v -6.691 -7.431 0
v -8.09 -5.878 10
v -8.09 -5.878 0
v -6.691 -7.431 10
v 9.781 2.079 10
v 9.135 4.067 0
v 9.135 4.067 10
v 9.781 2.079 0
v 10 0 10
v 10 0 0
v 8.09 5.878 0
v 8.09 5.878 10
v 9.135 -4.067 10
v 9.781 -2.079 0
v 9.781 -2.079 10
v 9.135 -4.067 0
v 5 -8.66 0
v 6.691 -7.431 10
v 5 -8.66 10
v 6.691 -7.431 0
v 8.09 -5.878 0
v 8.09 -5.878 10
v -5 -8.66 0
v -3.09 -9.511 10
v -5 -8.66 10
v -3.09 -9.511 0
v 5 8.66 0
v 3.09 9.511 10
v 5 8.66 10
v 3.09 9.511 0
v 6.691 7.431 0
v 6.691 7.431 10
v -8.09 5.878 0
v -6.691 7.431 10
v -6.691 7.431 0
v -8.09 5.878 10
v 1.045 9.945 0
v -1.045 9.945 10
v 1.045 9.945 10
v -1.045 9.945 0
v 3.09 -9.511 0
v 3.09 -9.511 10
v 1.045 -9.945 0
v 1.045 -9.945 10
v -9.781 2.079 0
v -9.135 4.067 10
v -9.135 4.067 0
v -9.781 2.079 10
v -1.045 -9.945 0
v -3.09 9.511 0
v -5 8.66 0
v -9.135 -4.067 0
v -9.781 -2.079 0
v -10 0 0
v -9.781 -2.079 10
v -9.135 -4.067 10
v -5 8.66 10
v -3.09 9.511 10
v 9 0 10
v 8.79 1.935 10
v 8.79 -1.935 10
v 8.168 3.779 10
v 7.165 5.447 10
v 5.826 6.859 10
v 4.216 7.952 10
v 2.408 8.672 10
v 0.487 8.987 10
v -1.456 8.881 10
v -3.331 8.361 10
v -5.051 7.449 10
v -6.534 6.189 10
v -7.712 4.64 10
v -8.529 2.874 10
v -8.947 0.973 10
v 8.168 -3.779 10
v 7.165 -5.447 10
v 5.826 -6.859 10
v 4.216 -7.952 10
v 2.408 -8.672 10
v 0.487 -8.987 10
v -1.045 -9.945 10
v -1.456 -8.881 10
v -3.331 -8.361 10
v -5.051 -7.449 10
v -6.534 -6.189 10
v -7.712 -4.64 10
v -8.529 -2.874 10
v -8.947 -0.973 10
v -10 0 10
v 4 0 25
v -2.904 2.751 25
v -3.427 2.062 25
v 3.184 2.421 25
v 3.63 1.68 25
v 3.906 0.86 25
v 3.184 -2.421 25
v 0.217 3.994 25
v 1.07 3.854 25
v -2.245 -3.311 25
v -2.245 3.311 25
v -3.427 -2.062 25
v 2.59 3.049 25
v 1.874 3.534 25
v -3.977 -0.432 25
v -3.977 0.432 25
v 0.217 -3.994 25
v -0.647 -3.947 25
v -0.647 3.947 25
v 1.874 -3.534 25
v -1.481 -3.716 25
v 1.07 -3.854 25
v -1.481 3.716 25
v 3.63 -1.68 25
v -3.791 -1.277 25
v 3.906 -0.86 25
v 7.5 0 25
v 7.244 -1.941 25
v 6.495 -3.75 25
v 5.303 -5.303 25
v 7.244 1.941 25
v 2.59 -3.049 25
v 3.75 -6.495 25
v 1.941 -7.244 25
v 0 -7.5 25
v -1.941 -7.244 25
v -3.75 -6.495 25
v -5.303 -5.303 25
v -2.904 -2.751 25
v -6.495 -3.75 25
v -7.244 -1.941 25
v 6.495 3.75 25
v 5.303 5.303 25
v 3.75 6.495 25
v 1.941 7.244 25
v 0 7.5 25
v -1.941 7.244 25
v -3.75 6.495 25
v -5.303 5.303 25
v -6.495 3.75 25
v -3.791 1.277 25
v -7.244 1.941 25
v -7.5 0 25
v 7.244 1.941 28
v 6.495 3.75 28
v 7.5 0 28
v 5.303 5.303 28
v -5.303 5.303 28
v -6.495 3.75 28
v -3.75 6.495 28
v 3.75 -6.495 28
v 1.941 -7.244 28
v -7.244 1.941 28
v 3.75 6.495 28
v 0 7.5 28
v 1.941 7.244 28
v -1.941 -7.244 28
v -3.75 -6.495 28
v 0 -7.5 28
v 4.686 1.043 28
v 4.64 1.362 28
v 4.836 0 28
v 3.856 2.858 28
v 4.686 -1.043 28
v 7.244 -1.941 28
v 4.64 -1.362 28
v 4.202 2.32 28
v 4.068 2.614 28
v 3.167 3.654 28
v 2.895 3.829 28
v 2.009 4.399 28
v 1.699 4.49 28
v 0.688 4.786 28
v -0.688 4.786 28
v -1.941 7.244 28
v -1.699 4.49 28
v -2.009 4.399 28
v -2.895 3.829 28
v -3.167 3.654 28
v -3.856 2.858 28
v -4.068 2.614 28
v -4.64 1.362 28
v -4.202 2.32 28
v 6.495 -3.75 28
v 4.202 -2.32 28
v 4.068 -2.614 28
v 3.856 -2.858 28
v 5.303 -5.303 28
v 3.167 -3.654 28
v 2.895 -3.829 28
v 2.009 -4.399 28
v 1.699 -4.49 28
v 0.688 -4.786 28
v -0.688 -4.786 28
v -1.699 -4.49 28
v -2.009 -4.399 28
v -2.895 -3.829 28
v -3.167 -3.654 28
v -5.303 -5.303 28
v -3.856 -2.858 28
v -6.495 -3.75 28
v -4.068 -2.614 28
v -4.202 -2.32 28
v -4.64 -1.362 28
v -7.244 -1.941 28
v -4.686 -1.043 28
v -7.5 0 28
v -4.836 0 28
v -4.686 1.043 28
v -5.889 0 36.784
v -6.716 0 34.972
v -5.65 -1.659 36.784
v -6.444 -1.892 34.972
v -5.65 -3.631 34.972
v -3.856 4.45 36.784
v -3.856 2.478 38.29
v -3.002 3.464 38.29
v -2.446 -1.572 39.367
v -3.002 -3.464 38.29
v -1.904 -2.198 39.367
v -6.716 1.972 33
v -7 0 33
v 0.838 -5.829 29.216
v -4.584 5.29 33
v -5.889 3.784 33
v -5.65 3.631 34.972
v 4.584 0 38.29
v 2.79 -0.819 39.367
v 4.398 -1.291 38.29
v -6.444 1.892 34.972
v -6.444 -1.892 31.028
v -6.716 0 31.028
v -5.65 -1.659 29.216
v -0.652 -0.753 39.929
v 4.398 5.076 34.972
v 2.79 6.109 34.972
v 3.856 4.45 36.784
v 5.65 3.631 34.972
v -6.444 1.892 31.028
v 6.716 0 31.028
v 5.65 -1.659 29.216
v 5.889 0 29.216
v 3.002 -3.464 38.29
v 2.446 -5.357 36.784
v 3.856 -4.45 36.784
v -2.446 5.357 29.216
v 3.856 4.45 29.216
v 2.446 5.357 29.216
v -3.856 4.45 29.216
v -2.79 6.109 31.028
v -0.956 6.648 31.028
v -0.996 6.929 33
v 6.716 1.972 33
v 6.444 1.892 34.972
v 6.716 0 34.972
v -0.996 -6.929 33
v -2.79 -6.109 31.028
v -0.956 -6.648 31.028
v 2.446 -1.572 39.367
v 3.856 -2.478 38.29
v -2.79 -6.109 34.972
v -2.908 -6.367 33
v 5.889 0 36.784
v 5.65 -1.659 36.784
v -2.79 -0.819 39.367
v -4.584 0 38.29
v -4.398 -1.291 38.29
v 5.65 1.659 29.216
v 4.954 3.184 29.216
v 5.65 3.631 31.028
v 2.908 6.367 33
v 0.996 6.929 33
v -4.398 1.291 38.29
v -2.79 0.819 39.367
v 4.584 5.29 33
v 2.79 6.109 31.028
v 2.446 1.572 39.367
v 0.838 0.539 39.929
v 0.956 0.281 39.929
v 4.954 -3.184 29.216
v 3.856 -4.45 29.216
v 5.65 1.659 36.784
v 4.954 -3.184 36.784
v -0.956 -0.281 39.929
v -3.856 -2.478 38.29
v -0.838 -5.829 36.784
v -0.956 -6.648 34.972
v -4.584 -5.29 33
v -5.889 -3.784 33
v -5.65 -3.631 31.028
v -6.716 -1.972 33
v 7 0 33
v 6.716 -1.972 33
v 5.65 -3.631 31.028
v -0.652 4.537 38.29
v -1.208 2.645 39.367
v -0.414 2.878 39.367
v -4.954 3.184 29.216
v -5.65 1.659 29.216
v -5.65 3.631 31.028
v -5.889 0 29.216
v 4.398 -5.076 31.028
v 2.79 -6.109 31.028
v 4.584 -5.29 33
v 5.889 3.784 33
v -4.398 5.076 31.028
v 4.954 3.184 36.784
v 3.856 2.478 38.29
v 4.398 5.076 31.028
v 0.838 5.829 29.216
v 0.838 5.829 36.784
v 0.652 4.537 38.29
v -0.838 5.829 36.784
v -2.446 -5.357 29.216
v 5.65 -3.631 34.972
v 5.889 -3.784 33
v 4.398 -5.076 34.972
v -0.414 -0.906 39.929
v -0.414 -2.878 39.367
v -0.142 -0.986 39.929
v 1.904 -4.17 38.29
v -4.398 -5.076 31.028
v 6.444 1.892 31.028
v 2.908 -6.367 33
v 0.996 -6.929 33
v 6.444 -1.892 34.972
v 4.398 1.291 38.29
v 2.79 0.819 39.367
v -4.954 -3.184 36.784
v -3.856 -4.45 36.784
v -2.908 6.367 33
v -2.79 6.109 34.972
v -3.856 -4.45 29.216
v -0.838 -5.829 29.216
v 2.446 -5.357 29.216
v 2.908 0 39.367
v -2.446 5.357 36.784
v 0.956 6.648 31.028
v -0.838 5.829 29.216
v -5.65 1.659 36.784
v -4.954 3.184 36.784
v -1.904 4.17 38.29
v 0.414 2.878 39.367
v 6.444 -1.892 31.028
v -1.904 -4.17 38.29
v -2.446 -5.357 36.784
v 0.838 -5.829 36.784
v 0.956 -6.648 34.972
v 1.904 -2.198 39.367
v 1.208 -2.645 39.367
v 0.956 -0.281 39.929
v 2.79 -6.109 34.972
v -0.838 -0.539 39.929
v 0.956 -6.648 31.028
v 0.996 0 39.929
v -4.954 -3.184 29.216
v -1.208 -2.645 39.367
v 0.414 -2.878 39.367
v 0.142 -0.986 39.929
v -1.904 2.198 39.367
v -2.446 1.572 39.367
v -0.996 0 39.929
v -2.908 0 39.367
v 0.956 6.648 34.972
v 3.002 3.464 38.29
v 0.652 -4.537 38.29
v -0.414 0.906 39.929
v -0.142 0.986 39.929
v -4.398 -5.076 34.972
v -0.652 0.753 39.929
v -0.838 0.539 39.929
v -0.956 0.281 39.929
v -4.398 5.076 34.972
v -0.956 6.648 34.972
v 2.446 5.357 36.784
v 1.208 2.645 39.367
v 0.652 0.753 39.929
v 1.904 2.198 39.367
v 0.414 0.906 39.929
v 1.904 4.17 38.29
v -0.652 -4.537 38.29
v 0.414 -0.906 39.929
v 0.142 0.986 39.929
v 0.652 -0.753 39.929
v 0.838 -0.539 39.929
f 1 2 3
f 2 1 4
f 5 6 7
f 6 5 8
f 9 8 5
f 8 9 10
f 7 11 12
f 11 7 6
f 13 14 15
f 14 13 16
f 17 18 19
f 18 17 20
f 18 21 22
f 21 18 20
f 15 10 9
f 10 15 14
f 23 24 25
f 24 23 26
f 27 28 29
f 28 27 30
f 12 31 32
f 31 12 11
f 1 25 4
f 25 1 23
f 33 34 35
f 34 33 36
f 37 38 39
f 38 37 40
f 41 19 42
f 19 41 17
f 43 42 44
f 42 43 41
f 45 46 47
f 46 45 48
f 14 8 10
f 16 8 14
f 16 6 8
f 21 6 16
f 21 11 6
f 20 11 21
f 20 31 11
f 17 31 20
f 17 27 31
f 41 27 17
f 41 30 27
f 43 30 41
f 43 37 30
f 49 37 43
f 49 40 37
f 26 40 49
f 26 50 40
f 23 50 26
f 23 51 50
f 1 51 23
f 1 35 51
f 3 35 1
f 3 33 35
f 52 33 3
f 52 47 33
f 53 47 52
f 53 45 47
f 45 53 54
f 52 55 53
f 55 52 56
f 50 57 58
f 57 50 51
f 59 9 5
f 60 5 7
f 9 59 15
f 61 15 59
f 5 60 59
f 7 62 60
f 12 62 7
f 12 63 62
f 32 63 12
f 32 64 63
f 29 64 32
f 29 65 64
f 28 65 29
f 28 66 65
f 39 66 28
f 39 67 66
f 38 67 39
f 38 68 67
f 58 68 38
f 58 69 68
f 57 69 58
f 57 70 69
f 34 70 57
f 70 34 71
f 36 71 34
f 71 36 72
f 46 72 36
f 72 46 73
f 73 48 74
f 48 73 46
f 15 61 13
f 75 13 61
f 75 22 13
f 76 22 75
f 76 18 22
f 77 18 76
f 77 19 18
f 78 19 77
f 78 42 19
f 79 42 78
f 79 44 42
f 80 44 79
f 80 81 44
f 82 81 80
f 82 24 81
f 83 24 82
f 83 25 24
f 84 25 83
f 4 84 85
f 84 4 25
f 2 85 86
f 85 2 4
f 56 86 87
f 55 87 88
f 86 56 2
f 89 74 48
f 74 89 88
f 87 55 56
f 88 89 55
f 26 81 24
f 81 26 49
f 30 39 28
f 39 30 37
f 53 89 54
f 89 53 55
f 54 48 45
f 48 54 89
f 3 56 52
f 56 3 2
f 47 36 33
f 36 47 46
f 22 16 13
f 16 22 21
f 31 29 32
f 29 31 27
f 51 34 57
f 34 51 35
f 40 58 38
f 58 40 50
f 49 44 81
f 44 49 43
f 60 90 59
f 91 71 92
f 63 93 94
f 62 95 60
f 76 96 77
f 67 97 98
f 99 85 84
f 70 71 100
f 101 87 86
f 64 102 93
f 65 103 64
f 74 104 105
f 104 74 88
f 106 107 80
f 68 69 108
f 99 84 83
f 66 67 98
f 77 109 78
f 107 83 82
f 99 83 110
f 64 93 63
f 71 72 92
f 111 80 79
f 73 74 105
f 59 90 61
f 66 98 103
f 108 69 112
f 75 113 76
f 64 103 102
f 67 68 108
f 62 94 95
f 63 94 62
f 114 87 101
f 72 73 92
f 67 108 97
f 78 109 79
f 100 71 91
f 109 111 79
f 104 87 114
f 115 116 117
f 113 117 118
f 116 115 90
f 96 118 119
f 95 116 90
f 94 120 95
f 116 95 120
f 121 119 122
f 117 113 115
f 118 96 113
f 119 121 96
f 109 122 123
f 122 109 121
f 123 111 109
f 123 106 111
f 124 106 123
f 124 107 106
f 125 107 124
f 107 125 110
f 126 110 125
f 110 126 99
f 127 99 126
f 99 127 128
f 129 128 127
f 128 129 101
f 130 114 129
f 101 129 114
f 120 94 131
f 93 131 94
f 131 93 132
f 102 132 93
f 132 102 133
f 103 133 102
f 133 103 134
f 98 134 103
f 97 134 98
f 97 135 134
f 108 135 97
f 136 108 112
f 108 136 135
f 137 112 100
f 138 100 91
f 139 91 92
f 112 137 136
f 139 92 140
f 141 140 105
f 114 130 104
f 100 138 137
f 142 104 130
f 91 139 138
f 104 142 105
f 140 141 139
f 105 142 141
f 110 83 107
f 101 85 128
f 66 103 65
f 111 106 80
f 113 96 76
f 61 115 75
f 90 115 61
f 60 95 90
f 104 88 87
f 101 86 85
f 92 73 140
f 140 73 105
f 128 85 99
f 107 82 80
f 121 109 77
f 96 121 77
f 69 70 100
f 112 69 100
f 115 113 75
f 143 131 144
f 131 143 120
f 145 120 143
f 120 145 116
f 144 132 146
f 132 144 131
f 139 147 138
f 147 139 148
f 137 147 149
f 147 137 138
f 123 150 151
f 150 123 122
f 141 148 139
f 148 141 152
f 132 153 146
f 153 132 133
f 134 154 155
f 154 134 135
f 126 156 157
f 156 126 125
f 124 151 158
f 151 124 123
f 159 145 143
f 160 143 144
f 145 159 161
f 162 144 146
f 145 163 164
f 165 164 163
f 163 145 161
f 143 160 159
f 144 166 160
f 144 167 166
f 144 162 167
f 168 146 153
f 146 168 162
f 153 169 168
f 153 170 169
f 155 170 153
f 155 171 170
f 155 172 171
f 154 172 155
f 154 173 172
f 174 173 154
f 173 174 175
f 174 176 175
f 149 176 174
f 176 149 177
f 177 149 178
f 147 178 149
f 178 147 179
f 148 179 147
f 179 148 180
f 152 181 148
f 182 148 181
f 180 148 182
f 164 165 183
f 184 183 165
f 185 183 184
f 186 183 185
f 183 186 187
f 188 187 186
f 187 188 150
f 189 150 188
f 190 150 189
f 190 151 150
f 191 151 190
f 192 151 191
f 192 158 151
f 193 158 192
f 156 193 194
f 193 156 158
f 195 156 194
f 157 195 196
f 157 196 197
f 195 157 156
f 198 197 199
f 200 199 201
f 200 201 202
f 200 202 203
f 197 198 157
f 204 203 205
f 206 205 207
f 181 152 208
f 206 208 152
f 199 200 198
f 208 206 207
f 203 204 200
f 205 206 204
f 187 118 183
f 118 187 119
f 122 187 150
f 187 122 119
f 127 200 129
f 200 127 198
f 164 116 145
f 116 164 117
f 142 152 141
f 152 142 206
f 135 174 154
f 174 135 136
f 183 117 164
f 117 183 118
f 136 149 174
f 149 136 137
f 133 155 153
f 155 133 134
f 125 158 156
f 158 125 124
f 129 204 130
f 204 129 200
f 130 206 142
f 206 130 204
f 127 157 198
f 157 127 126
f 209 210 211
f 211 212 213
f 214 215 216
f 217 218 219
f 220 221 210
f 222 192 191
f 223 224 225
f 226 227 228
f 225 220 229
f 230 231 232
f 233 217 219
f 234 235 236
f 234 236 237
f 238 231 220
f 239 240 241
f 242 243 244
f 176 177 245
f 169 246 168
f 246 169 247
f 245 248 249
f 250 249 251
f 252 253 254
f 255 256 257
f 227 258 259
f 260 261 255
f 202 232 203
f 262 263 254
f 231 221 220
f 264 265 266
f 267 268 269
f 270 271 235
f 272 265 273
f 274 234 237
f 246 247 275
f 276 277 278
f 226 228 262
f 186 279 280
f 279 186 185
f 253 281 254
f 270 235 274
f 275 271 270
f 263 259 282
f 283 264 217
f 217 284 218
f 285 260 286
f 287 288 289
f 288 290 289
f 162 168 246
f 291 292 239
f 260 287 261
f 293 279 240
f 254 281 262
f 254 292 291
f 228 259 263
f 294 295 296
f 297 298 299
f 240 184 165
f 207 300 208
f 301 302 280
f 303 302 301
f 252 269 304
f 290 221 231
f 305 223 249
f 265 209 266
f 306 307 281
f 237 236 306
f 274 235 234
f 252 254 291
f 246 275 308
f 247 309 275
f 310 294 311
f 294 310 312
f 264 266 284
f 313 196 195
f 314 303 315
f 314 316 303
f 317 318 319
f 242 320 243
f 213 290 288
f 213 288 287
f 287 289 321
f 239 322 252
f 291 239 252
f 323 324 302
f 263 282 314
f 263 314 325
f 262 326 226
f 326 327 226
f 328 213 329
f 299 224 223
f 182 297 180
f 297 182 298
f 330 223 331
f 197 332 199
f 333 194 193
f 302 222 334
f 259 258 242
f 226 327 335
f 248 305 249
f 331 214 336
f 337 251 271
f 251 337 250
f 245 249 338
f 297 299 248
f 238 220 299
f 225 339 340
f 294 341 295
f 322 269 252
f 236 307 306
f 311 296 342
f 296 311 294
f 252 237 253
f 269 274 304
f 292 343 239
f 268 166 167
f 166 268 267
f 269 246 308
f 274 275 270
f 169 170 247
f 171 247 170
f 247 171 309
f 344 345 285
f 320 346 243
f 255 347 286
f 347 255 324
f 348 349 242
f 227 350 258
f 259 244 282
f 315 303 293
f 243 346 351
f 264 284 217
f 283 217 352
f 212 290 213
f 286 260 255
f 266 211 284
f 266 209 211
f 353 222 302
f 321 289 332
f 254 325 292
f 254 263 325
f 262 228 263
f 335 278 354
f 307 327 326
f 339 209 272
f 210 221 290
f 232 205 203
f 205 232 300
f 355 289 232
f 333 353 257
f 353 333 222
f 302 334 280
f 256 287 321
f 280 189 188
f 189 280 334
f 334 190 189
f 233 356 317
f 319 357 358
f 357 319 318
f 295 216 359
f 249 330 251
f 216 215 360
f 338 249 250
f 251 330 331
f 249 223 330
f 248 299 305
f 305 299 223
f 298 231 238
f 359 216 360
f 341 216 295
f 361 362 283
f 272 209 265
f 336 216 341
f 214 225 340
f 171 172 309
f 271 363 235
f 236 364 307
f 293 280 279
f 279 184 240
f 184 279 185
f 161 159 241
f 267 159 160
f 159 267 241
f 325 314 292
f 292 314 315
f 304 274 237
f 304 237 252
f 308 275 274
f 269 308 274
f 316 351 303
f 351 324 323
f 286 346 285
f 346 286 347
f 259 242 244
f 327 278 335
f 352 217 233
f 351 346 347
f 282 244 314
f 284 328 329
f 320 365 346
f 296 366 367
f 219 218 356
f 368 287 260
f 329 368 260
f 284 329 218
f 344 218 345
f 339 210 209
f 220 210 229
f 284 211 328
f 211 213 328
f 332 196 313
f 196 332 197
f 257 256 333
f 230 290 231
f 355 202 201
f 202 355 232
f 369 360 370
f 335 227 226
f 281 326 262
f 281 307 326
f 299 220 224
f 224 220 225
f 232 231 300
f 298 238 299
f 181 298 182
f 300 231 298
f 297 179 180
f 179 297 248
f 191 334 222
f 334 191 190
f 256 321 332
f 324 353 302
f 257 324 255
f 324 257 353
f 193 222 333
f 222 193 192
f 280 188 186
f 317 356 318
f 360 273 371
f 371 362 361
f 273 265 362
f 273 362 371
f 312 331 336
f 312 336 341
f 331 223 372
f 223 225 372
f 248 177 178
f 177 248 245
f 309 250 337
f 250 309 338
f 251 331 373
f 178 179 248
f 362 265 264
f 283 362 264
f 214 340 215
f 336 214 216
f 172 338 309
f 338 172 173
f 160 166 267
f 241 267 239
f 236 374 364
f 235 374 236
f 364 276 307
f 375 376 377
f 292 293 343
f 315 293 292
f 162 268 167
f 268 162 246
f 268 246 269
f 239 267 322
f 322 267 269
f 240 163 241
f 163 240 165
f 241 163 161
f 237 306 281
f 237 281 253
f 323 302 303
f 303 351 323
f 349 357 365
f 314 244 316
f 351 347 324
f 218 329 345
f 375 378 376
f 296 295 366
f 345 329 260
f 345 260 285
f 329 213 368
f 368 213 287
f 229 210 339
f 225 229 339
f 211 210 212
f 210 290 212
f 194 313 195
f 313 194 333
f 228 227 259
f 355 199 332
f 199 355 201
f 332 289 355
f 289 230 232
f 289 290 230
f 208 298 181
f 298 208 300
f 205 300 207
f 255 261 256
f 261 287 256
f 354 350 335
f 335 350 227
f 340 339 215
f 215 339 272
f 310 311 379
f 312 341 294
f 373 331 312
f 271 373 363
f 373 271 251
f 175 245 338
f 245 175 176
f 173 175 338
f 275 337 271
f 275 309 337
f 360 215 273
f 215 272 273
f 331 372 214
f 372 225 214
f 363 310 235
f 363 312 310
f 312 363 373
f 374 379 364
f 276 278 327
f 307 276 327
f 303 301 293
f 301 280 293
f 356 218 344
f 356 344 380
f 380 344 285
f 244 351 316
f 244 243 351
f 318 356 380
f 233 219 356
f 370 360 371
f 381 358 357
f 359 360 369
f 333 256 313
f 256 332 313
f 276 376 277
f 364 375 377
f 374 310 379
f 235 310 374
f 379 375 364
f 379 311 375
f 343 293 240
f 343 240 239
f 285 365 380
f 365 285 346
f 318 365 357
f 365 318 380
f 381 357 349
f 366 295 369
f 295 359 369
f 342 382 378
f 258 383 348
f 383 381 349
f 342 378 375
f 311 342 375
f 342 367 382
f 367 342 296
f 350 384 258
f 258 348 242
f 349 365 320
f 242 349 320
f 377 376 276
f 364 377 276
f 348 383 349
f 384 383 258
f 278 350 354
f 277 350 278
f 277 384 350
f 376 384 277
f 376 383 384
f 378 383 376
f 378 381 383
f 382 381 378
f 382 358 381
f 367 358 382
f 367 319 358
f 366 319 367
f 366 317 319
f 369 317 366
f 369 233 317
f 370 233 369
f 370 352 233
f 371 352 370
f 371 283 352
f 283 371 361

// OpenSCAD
// Generated by SolidPython 1.1.1 on 2021-10-30 03:32:37


union() {
	cylinder(d = 20, h = 10);
	translate(v = [0, 0, 10]) {
		cylinder(d1 = 18, d2 = 8, h = 15);
	}
	translate(v = [0, 0, 25]) {
		cylinder(d = 15, h = 3);
	}
	translate(v = [0, 0, 33]) {
		sphere(r = 7);
	}
}
/***********************************************
*********      SolidPython code:      **********
************************************************
 
from solid import *
from solid.utils import *

#total height 4cm

base = cylinder(d=20, h=10)
body = cylinder(d1=18, d2=8, h=15)
collar = cylinder(d=15, h=3)
head = sphere(r=7)

pawn = base + up(10)(body) + up(25)(collar) + up(33)(head)
pawn = base + body
pawn = union()(
    base,
    up(10)(body),
    up(25)(collar),
    up(33)(head)
    )
scad_render_to_file(pawn, "./pawn.scad") 
 
************************************************/
